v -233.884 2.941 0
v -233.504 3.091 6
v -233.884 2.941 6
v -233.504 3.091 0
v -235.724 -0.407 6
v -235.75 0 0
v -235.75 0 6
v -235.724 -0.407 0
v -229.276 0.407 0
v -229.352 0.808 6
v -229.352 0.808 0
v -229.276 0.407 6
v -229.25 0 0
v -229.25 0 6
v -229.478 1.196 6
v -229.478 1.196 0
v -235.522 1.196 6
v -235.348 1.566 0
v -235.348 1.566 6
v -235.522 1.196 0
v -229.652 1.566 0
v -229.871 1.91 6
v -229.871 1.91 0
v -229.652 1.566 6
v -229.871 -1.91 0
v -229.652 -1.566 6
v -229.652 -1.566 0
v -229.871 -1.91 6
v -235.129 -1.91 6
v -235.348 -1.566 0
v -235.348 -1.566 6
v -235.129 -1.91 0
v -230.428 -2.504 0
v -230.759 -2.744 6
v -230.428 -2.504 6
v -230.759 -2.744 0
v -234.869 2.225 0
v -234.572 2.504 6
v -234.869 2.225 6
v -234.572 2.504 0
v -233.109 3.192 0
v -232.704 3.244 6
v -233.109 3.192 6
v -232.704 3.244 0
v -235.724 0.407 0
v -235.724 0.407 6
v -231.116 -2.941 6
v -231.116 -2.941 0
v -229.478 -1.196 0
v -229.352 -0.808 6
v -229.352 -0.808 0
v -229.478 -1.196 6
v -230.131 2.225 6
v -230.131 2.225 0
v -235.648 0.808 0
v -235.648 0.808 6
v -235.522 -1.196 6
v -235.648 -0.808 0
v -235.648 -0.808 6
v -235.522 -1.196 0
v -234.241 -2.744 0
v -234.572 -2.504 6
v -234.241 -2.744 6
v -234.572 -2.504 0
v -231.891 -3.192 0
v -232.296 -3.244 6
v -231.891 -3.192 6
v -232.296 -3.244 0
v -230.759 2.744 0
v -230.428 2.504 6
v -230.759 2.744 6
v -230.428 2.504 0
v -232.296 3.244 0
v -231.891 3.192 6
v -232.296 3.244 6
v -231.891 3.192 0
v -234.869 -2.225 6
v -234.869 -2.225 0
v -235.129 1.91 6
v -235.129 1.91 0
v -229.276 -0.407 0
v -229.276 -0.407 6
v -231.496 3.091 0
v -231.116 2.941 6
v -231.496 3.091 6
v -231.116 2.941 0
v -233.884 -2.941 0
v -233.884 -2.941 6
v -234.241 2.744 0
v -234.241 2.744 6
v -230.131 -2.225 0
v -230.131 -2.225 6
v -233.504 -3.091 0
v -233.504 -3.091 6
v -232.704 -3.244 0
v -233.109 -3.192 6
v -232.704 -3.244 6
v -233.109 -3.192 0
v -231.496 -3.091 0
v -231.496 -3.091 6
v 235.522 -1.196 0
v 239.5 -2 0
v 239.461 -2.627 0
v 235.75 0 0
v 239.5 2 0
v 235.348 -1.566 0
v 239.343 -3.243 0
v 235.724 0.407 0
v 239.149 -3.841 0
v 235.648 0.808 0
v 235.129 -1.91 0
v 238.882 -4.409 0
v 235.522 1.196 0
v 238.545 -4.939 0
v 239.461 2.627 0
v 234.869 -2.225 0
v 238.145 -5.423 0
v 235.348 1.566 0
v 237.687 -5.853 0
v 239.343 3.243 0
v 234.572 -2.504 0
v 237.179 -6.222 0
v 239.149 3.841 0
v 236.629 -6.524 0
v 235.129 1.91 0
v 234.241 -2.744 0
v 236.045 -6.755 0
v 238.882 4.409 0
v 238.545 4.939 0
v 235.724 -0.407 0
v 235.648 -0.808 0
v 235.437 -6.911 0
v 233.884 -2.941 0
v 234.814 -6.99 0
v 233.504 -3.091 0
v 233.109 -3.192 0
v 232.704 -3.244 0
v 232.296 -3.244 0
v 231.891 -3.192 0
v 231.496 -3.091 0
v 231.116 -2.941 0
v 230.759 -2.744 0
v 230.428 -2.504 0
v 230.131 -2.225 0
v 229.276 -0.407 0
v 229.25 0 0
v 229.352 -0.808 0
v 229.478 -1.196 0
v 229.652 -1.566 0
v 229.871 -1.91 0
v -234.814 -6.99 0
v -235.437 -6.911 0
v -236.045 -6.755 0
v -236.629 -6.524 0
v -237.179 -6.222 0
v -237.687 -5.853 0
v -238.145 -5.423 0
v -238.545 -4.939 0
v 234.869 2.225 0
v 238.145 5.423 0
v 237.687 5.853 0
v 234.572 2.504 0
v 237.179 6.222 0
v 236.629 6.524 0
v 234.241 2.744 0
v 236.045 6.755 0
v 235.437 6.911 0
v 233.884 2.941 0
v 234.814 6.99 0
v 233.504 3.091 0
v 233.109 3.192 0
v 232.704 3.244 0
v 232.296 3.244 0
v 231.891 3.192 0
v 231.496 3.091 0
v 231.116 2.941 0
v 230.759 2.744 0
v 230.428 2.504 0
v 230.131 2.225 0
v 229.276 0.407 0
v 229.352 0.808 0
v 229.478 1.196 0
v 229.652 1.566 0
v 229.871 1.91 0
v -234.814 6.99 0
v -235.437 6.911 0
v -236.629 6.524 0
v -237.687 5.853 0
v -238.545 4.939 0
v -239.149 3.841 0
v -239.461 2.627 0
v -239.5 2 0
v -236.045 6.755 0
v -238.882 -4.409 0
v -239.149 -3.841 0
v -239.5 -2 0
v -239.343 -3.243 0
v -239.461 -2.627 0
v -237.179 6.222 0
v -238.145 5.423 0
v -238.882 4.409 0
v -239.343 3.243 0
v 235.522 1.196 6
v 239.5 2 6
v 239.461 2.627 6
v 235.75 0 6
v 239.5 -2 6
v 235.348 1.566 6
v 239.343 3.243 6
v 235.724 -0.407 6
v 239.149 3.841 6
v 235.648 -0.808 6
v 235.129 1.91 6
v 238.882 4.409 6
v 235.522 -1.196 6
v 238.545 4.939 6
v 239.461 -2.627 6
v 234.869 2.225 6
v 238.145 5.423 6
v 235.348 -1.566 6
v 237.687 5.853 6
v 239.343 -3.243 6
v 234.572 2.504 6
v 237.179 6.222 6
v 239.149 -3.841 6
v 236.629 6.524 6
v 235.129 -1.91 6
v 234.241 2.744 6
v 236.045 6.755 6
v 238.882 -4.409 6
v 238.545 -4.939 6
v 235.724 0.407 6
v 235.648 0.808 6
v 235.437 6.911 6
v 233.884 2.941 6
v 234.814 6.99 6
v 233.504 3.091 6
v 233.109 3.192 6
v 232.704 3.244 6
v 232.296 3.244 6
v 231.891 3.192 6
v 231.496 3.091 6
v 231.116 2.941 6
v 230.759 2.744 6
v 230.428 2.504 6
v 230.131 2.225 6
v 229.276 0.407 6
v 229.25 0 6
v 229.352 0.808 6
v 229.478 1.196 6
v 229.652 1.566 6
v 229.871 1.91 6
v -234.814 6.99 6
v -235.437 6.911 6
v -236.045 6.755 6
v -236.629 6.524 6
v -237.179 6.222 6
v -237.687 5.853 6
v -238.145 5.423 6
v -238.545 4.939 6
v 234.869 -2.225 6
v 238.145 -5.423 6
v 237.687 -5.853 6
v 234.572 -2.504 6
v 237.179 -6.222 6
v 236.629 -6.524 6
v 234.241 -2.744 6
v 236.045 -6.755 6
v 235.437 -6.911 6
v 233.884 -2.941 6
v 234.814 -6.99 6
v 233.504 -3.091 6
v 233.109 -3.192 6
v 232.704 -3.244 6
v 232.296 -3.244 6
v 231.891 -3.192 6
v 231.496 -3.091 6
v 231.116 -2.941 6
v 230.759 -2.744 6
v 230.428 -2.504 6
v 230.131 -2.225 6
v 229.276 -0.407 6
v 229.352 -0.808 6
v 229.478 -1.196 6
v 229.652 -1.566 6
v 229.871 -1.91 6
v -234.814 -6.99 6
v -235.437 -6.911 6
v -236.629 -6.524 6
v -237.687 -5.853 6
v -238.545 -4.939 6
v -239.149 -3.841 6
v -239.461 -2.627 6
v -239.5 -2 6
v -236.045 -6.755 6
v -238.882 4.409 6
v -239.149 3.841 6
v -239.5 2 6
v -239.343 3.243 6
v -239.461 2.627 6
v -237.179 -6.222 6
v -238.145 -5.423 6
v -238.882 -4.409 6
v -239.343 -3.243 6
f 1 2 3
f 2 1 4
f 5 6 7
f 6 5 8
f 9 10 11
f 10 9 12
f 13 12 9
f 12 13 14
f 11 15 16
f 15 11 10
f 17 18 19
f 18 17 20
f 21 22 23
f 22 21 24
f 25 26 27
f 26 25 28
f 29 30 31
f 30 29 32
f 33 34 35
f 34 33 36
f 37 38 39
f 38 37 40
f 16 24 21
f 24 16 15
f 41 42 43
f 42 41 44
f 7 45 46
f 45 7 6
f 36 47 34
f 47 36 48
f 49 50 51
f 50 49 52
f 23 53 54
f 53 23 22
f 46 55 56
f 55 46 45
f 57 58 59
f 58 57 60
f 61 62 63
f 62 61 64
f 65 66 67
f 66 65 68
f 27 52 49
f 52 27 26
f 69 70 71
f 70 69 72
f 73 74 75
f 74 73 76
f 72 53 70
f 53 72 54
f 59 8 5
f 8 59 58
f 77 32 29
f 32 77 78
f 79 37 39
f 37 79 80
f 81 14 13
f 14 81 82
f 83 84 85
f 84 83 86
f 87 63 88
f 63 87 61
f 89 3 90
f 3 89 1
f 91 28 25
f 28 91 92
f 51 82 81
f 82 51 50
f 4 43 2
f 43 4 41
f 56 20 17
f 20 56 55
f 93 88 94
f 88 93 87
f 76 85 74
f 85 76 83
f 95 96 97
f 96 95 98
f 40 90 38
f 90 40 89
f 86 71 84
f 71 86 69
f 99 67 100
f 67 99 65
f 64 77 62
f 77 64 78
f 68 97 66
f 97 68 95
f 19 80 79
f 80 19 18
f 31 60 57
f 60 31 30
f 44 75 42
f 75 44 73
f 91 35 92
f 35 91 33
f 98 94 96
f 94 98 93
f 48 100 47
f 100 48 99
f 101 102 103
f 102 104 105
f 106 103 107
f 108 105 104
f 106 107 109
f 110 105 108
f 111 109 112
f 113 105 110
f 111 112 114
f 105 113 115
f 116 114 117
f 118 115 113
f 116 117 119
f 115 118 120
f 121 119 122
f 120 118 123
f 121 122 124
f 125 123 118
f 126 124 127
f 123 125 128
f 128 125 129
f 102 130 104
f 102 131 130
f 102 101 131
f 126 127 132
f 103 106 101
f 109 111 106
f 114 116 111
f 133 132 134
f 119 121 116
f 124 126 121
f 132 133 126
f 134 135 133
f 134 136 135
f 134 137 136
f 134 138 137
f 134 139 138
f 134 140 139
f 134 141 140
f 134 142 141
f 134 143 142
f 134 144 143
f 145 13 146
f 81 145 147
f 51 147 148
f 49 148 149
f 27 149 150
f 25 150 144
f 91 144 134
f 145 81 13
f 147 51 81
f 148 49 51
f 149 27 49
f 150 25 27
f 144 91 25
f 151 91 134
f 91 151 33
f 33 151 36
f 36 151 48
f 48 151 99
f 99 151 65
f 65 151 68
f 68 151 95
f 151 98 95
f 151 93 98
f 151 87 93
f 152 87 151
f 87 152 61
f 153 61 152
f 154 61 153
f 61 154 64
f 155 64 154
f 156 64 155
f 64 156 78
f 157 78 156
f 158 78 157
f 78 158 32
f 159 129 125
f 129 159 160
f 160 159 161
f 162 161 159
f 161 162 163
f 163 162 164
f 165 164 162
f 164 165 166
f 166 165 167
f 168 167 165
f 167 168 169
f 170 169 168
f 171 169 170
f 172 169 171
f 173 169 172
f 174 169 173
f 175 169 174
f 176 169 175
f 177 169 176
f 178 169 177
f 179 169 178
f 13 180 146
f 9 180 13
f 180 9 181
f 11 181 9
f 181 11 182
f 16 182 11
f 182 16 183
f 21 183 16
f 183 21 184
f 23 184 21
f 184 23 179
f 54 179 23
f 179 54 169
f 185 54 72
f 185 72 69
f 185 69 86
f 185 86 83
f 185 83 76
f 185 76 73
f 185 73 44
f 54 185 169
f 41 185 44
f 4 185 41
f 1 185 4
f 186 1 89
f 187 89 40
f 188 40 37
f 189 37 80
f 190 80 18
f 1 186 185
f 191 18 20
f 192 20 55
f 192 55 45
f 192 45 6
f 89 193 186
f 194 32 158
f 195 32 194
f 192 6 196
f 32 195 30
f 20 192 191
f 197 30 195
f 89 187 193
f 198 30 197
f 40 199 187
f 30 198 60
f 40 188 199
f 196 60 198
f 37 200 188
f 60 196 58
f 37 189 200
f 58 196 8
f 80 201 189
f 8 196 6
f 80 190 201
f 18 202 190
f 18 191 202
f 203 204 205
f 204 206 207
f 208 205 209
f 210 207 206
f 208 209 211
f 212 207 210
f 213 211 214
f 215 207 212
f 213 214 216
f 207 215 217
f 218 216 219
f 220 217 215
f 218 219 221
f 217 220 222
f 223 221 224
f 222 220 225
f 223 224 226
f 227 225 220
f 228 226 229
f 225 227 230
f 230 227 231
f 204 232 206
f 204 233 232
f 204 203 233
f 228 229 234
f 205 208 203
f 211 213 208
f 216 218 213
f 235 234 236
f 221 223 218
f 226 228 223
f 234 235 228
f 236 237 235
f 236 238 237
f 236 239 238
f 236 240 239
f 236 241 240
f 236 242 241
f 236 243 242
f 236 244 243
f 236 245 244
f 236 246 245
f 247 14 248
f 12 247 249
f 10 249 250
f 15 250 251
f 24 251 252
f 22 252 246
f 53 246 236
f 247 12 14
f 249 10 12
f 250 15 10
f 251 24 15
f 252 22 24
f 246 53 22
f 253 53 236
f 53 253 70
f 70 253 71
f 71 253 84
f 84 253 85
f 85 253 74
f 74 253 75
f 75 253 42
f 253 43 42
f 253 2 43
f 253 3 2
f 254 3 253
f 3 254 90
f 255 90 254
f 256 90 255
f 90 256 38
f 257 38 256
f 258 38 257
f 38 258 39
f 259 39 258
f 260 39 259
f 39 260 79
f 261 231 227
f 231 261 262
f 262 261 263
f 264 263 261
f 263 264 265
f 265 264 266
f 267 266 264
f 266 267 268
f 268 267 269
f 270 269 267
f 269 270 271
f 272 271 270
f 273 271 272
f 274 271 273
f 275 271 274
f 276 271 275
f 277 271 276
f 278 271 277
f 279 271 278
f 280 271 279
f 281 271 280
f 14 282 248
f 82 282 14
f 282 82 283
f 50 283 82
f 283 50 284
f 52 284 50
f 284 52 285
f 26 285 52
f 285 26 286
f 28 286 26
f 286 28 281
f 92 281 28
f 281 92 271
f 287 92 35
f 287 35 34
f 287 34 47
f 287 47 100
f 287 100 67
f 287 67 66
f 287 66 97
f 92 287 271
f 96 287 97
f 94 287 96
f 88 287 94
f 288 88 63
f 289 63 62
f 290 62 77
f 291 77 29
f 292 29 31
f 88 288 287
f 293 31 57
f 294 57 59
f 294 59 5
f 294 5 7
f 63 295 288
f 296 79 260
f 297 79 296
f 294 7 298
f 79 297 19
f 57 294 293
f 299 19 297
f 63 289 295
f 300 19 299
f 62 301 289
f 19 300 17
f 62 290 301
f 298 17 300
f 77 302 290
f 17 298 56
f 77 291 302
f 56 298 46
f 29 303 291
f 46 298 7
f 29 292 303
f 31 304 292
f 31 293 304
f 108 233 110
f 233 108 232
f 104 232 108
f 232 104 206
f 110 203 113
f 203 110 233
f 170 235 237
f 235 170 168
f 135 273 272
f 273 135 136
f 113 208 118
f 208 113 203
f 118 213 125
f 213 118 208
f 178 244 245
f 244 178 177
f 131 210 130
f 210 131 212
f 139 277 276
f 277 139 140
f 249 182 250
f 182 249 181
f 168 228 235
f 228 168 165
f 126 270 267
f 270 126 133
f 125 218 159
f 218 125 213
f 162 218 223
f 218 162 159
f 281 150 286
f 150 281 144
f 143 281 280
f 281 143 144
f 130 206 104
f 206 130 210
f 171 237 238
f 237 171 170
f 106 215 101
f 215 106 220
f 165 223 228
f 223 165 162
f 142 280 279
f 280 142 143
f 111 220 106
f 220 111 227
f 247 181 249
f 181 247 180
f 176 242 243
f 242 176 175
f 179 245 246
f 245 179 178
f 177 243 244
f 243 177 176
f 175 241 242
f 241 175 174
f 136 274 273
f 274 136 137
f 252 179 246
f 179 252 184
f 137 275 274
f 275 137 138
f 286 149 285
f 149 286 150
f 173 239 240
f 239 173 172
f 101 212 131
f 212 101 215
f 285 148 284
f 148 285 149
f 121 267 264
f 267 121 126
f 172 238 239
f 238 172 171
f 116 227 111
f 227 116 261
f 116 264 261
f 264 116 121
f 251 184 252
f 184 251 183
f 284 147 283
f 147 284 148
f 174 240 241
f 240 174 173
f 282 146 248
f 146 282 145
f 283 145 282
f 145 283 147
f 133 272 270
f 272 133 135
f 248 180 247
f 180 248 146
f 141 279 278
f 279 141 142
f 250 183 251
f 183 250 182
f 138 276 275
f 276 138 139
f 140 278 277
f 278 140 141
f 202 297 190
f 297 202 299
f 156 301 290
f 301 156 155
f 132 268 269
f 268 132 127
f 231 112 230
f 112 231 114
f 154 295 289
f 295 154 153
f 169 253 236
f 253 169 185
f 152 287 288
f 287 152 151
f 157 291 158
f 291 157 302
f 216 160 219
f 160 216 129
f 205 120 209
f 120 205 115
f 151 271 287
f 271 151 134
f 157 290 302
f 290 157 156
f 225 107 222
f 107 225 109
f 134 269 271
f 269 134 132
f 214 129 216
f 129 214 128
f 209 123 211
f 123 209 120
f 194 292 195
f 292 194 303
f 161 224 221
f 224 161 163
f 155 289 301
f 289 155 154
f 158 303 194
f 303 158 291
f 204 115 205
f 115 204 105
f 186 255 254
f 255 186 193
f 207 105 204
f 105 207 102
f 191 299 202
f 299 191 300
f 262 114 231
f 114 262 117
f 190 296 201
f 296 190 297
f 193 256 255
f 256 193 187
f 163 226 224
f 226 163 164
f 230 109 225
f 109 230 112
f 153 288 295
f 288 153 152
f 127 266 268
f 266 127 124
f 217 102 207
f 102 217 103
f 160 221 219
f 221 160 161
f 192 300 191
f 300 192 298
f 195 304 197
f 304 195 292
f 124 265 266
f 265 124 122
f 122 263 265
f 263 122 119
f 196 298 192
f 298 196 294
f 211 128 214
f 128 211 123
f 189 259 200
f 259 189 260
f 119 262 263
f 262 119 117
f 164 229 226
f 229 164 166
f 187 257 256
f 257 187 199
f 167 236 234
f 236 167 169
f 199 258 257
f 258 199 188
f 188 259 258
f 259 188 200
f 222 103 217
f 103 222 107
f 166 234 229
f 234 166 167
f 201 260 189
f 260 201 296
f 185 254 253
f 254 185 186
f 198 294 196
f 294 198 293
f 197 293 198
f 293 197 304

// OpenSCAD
$fn = 50;


difference() {
	union() {
		hull() {
			translate(v = [-234.5000000000, 2.0000000000, 0]) {
				cylinder(h = 6, r = 5);
			}
			translate(v = [234.5000000000, 2.0000000000, 0]) {
				cylinder(h = 6, r = 5);
			}
			translate(v = [-234.5000000000, -2.0000000000, 0]) {
				cylinder(h = 6, r = 5);
			}
			translate(v = [234.5000000000, -2.0000000000, 0]) {
				cylinder(h = 6, r = 5);
			}
		}
	}
	union() {
		translate(v = [-232.5000000000, 0.0000000000, 0]) {
			cylinder(h = 6, r = 3.2500000000);
		}
		translate(v = [232.5000000000, 0.0000000000, 0]) {
			cylinder(h = 6, r = 3.2500000000);
		}
		translate(v = [-232.5000000000, 0.0000000000, 0]) {
			cylinder(h = 6, r = 1.8000000000);
		}
		translate(v = [232.5000000000, 0.0000000000, 0]) {
			cylinder(h = 6, r = 1.8000000000);
		}
		translate(v = [-232.5000000000, 0.0000000000, 0]) {
			cylinder(h = 6, r = 1.8000000000);
		}
		translate(v = [232.5000000000, 0.0000000000, 0]) {
			cylinder(h = 6, r = 1.8000000000);
		}
		translate(v = [-232.5000000000, 0.0000000000, 0]) {
			cylinder(h = 6, r = 1.8000000000);
		}
		translate(v = [232.5000000000, 0.0000000000, 0]) {
			cylinder(h = 6, r = 1.8000000000);
		}
	}
}
